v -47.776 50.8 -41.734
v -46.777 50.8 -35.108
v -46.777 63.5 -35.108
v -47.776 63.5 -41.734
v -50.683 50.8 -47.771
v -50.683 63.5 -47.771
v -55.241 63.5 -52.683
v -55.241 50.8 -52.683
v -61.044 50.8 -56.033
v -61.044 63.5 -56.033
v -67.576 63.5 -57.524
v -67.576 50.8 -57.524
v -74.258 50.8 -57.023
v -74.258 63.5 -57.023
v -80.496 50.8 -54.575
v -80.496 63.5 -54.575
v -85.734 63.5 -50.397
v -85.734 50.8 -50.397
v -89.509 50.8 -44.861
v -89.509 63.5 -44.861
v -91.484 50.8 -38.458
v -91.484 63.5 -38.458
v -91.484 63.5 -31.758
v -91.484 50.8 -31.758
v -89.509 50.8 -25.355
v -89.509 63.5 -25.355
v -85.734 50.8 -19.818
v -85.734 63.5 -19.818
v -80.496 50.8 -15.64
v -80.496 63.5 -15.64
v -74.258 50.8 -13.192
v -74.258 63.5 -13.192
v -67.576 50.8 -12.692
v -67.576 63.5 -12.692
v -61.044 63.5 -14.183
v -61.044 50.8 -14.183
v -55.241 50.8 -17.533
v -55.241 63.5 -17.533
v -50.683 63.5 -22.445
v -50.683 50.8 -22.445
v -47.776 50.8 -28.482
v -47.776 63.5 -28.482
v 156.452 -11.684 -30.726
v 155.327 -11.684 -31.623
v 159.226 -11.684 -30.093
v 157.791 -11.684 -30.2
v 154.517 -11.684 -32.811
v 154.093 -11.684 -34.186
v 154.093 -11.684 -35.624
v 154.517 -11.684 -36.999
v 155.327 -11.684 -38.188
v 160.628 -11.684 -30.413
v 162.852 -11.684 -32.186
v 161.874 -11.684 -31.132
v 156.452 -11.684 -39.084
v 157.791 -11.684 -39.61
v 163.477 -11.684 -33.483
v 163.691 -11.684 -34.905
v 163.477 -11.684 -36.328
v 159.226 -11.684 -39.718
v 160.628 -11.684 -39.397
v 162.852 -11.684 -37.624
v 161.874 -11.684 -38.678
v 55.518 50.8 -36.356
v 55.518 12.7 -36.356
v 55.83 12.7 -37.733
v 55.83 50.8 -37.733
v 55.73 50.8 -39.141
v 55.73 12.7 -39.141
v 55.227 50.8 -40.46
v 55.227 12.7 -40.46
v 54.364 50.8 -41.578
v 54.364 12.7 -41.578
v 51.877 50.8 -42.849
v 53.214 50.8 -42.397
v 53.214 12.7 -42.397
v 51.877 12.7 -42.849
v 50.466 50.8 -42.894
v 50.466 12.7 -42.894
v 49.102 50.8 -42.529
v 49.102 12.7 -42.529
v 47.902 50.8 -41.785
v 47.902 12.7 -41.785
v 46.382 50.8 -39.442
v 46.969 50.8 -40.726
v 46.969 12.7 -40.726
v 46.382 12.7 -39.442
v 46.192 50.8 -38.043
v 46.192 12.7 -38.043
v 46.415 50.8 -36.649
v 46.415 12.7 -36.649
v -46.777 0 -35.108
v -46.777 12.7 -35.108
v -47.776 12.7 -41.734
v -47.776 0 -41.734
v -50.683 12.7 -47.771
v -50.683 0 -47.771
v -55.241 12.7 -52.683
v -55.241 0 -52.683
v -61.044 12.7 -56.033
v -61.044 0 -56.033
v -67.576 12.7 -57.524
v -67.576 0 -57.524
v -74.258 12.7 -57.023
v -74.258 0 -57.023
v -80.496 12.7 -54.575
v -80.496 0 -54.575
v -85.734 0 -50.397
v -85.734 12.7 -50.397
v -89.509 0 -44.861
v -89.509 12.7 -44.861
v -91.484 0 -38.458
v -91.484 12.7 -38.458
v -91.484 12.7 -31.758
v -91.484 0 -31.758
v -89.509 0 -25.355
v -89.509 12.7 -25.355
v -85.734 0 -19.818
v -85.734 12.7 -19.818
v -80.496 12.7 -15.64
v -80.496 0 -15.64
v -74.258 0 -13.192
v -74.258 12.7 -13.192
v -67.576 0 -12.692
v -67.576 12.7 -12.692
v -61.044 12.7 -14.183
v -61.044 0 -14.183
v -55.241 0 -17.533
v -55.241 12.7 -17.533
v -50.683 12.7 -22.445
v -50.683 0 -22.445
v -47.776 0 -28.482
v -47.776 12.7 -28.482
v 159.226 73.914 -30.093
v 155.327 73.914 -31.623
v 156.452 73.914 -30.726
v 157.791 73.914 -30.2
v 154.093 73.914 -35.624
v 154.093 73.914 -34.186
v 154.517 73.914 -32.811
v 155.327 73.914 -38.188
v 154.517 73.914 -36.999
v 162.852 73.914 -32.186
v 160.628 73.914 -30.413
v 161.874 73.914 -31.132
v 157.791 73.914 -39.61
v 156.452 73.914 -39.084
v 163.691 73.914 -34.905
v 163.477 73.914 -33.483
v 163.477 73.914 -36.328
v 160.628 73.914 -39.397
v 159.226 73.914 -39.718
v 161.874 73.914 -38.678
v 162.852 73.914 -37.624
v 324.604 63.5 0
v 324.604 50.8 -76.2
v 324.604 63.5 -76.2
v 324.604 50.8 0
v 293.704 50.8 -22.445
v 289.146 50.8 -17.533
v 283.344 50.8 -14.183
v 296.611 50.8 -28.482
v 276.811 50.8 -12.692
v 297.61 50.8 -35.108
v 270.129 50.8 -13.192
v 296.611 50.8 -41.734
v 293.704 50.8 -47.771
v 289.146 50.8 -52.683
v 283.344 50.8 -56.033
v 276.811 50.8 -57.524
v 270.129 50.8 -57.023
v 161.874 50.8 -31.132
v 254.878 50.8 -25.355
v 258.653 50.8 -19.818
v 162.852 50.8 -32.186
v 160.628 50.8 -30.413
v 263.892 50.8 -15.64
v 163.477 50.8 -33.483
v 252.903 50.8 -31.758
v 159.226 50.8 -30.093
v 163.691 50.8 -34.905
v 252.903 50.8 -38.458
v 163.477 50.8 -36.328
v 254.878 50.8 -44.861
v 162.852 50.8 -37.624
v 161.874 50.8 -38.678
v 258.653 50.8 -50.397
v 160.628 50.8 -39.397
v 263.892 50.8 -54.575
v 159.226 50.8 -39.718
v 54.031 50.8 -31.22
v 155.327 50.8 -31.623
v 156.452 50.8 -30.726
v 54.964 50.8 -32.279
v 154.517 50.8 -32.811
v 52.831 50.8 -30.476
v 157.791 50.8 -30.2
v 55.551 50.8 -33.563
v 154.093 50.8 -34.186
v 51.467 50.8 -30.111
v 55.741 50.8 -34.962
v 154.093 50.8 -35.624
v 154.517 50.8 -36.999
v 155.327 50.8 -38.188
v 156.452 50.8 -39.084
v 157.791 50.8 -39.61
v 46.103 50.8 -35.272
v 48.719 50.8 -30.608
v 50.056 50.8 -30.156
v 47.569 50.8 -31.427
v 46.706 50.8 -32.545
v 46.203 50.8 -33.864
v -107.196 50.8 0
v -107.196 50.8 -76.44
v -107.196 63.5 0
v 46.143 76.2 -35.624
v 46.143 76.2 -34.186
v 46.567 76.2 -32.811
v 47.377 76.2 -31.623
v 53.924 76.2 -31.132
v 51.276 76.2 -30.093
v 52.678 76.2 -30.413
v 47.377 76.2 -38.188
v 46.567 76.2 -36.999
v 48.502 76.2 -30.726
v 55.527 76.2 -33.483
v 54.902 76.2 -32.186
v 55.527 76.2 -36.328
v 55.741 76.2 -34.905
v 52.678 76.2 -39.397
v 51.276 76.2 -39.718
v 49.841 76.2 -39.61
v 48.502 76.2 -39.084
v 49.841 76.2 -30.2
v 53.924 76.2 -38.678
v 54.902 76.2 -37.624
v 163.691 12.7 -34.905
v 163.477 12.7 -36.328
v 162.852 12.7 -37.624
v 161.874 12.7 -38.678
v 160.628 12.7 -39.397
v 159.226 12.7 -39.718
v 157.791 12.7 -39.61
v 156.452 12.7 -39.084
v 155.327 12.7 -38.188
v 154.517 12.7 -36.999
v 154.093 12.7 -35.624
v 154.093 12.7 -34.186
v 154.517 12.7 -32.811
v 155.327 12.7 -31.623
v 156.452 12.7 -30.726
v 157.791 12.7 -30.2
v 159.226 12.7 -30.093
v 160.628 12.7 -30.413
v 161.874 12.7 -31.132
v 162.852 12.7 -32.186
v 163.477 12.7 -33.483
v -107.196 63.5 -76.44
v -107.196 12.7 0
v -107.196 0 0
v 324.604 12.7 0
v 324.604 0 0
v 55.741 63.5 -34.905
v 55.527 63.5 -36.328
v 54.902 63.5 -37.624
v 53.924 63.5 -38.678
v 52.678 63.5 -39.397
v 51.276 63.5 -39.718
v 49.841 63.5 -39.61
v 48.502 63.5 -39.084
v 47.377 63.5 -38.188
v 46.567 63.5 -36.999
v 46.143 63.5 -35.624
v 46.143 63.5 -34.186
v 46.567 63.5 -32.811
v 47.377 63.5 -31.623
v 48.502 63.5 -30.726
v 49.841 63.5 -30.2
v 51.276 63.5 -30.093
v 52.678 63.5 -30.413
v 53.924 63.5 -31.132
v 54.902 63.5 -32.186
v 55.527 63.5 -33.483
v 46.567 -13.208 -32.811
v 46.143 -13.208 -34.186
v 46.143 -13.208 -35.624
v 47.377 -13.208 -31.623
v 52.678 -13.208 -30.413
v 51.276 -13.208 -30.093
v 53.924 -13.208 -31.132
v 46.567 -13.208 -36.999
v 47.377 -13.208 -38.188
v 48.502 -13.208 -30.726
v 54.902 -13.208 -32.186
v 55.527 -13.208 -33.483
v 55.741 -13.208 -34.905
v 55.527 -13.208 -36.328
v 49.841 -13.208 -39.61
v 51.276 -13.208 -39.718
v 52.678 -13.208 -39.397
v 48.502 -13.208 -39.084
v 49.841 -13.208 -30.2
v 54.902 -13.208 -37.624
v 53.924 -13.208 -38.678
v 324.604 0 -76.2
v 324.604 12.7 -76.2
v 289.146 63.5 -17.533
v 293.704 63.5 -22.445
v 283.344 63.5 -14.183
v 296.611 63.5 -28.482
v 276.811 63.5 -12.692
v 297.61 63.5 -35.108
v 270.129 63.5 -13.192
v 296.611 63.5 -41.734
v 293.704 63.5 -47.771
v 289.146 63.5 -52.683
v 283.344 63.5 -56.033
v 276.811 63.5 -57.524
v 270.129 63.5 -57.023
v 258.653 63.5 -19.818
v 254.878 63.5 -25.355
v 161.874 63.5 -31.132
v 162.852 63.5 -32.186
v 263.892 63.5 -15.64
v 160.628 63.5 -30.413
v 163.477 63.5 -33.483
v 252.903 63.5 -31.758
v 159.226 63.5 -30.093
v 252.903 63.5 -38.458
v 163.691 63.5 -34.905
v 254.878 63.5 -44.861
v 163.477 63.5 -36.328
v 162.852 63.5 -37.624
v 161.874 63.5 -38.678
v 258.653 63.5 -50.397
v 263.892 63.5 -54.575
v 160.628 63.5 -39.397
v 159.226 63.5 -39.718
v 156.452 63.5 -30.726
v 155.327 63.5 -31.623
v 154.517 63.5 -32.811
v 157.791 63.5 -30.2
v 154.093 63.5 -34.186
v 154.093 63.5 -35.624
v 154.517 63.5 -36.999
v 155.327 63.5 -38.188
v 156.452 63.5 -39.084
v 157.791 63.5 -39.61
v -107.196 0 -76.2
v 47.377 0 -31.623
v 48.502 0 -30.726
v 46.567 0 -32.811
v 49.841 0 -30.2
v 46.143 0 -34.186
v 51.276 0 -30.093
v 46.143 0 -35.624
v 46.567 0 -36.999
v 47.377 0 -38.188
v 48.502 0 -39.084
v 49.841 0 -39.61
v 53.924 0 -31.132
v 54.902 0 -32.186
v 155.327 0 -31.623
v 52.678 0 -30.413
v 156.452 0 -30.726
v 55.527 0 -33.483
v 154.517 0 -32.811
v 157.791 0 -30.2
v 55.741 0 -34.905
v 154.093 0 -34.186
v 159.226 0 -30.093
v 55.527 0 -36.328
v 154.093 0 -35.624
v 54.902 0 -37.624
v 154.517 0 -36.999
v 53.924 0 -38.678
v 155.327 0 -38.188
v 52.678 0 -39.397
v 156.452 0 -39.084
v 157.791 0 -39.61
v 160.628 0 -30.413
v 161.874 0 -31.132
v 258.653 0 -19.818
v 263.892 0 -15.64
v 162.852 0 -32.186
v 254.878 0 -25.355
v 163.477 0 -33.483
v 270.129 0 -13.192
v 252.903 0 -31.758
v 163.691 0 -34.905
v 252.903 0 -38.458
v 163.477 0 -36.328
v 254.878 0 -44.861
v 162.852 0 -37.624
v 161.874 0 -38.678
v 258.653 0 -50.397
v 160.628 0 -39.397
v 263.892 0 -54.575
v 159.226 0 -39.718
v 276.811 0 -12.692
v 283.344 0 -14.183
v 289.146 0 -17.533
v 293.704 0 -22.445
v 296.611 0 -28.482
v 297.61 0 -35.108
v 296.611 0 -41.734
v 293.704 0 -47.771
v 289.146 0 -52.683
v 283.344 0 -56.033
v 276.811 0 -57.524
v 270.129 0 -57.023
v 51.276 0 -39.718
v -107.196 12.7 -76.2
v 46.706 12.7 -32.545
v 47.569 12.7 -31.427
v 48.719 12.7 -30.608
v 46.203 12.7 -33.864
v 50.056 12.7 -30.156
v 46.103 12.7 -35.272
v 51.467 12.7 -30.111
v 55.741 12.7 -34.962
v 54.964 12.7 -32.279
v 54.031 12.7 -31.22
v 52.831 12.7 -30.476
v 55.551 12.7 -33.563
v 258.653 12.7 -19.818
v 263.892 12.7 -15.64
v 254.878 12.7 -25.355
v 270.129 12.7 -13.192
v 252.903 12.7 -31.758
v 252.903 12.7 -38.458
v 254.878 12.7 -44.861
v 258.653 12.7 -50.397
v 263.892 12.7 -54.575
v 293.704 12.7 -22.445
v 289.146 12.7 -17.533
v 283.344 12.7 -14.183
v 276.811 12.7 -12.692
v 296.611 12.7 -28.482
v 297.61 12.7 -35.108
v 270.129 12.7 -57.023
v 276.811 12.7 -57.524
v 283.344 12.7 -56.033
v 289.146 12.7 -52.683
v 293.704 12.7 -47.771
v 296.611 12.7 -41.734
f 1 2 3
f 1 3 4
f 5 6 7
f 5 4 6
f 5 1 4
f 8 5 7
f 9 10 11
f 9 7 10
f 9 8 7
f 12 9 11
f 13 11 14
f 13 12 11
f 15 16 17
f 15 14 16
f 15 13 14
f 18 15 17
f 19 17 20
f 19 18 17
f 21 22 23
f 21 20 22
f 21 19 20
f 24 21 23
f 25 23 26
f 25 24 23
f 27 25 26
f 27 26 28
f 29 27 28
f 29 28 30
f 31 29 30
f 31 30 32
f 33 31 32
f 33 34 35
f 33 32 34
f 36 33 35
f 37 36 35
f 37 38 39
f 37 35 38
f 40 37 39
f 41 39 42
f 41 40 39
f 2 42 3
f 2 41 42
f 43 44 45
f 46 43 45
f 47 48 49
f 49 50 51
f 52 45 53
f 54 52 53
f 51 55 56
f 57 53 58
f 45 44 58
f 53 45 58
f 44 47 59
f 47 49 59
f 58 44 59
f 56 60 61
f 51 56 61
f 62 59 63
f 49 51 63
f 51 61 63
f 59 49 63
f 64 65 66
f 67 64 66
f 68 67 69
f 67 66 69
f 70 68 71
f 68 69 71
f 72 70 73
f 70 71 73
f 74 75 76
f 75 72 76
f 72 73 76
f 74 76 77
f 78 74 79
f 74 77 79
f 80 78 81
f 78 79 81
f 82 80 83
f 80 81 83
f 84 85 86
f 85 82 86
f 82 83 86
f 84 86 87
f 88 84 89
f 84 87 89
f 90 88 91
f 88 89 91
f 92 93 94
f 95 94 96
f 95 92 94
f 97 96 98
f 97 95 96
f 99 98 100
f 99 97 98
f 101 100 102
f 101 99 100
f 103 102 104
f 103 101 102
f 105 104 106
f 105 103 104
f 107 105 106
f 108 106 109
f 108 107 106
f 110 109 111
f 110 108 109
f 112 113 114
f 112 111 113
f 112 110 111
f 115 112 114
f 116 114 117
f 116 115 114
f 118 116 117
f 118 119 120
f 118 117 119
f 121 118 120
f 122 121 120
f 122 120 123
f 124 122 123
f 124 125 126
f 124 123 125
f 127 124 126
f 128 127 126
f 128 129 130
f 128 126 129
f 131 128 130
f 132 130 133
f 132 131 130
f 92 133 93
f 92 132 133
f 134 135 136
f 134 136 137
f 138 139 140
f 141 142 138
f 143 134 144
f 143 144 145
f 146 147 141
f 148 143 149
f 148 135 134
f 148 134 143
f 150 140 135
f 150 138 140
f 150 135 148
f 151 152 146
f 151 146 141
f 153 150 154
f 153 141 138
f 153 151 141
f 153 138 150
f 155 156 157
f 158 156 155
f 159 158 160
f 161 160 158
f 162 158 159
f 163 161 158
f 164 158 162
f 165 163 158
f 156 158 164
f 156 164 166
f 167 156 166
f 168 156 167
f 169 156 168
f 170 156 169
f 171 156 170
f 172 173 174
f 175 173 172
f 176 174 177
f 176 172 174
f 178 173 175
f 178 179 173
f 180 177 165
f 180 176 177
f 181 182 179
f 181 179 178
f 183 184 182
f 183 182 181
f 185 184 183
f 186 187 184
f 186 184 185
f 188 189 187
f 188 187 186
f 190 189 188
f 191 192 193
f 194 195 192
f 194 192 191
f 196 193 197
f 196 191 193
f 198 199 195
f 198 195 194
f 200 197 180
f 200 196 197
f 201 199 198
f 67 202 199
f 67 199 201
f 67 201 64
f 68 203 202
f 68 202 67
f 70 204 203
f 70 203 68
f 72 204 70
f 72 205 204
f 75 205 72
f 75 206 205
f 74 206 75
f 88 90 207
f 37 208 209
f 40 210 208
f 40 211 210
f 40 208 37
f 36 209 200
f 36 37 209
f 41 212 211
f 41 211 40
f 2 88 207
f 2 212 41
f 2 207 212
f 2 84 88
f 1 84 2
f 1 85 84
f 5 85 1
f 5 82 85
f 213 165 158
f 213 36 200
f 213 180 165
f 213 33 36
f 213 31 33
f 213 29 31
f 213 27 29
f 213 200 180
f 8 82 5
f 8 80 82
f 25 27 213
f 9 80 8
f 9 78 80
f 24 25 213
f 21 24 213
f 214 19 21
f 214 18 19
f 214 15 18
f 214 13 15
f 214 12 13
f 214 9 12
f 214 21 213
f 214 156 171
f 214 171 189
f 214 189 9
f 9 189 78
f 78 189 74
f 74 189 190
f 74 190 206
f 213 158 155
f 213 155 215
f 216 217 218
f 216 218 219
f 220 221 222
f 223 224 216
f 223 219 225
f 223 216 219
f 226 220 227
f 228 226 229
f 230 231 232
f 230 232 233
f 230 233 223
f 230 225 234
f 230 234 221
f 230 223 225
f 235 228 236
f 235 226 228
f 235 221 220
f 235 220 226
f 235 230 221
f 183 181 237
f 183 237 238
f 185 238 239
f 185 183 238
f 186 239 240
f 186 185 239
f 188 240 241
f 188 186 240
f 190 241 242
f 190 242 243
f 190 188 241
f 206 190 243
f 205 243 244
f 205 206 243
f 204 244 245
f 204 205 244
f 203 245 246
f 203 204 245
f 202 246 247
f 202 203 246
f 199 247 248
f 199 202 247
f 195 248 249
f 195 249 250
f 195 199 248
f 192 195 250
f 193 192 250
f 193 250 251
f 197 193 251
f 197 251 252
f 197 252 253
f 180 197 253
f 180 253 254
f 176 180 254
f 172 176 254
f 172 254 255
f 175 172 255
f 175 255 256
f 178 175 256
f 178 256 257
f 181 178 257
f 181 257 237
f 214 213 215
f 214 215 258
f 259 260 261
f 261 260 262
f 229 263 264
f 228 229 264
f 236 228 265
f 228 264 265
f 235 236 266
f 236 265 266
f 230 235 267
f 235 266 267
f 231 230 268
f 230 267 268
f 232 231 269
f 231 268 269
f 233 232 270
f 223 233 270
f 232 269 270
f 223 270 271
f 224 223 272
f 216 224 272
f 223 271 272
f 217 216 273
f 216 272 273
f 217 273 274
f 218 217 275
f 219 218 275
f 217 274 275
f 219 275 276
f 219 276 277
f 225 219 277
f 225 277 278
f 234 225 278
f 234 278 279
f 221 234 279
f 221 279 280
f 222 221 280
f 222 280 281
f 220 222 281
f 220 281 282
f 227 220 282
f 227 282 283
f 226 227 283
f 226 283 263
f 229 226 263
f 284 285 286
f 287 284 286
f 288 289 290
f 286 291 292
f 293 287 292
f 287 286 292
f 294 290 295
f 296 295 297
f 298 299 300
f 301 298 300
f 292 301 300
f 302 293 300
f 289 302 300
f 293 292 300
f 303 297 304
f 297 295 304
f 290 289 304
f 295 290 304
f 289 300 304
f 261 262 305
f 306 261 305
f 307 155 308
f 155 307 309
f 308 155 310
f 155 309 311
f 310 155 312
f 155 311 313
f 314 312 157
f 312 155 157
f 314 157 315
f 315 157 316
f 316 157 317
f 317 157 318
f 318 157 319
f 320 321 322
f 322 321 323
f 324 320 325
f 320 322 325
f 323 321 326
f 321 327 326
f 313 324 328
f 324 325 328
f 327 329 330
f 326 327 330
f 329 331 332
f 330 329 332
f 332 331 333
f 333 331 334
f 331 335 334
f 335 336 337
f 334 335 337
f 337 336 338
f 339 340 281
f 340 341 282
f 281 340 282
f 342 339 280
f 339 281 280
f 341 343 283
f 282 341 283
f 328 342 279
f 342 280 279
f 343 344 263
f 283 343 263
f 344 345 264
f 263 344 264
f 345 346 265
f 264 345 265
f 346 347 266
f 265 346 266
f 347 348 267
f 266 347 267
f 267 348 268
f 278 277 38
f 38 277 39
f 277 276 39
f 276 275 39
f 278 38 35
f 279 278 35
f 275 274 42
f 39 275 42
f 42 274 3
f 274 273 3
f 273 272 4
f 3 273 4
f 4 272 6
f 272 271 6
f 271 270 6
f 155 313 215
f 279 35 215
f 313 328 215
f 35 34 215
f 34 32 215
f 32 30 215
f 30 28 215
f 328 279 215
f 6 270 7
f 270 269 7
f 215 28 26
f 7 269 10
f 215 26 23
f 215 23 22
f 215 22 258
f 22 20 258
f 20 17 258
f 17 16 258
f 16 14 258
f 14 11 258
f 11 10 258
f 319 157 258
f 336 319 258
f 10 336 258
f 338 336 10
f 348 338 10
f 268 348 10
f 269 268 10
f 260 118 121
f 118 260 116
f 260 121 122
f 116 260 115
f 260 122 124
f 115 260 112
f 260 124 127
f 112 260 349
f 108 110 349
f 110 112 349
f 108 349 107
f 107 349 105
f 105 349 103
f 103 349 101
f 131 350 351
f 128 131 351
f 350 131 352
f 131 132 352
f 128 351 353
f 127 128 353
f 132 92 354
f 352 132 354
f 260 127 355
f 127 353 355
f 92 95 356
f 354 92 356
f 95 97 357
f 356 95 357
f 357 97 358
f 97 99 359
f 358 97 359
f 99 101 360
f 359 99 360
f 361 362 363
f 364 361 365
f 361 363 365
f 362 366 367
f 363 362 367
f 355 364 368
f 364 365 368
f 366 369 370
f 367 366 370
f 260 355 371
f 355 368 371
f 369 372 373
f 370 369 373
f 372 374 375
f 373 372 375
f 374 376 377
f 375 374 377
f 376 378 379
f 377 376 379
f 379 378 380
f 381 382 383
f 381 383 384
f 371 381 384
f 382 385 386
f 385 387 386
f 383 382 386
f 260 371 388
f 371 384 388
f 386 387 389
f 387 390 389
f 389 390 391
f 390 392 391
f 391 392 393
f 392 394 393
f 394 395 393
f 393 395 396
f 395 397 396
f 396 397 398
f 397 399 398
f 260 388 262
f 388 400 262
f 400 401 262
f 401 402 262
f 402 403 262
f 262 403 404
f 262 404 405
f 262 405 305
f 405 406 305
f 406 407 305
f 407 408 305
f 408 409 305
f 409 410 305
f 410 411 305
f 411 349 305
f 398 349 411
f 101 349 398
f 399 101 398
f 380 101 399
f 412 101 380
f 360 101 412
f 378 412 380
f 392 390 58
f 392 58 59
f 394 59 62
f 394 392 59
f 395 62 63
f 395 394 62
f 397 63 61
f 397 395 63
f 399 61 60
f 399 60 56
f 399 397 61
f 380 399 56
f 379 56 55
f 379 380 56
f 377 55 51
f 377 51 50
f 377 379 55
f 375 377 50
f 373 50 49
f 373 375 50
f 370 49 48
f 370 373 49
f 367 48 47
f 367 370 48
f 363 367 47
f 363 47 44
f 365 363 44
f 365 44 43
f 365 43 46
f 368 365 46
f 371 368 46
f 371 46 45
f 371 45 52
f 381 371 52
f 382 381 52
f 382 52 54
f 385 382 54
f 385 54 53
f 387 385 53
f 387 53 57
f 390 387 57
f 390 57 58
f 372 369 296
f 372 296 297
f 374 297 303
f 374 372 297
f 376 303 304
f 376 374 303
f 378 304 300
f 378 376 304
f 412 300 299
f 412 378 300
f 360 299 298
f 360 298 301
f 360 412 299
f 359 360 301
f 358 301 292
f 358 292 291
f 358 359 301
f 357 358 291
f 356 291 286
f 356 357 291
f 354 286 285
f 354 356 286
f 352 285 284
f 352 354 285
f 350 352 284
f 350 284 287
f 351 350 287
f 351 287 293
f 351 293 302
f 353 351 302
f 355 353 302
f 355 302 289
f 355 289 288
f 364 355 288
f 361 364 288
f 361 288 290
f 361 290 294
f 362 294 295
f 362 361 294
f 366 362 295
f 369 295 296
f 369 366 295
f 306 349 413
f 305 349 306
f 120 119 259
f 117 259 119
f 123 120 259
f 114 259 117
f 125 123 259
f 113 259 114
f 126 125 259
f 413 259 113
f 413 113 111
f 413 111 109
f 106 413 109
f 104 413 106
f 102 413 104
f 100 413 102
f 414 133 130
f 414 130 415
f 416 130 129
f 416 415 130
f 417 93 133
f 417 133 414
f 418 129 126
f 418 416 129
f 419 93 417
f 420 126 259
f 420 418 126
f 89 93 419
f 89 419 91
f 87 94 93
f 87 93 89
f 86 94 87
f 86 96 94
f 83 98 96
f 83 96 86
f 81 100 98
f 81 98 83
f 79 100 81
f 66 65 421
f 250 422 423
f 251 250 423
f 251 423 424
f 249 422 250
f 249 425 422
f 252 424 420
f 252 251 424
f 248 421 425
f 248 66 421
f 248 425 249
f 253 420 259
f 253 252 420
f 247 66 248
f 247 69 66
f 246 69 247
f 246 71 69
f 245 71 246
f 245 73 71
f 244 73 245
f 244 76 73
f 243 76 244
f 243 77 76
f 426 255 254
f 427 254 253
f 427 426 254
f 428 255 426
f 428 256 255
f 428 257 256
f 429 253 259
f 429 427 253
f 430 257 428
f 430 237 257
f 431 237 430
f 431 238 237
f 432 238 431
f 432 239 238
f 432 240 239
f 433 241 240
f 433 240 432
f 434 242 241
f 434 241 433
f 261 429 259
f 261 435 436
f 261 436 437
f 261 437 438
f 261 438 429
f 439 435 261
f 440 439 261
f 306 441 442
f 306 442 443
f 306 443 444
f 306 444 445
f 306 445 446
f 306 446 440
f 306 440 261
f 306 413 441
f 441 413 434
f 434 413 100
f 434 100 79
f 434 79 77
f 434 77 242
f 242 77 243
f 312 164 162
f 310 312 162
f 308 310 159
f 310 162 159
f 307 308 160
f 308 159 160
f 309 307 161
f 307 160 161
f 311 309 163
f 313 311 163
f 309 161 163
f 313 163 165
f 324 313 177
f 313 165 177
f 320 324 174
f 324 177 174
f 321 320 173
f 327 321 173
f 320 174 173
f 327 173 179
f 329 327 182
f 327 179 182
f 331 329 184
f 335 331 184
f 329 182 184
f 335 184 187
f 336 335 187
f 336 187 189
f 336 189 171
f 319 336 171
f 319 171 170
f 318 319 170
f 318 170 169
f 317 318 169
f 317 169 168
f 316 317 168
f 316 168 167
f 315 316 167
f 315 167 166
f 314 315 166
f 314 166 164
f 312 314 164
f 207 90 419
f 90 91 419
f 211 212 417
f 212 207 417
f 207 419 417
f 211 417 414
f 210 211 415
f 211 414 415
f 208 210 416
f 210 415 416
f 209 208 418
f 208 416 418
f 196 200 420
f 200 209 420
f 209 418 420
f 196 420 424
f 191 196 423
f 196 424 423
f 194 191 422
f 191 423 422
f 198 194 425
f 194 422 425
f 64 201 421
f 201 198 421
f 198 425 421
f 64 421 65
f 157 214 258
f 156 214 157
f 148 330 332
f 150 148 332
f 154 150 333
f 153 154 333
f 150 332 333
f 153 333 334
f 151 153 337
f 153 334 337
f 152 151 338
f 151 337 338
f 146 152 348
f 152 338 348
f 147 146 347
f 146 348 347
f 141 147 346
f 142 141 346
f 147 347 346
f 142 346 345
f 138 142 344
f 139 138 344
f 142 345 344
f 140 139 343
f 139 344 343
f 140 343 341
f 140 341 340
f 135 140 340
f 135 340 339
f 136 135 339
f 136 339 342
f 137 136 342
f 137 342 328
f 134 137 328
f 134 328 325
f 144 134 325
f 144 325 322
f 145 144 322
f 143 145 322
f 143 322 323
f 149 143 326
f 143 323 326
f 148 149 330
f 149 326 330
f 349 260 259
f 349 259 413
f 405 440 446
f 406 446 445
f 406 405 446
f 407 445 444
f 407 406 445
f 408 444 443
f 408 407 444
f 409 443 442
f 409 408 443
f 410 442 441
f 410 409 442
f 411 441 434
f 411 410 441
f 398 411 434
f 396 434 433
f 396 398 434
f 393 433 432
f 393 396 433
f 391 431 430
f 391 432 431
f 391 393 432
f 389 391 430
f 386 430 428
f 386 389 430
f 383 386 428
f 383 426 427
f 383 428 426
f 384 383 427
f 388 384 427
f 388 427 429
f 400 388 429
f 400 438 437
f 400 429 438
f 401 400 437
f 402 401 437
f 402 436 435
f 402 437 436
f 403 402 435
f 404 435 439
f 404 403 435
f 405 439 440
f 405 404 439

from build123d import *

# Parameters (mm, degrees)
CROQUIS1_W                   = 431.8
CROQUIS1_H                   = 76.2
SALIENTE_EXTRUIR2_DEPTH      = 12.7
CROQUIS3_R                   = 4.826
SALIENTE_EXTRUIR4_DEPTH      = 63.5
CROQUIS4_R                   = 22.479
CORTAR_EXTRUIR3_DEPTH        = 219.71
CROQUIS6_R                   = 22.479
CORTAR_EXTRUIR5_DEPTH        = 180.594
SALIENTE_EXTRUIR5_DEPTH      = 12.7
CROQUIS8_R                   = 22.479
CORTAR_EXTRUIR7_DEPTH        = 46.736
CORTAR_EXTRUIR7_DEPTH_BACK   = 115.062
CROQUIS9_R                   = 22.479
CORTAR_EXTRUIR8_DEPTH        = 153.162
CORTAR_EXTRUIR8_DEPTH_BACK   = 103.886
CROQUIS10_R                  = 4.826
SALIENTE_EXTRUIR6_DEPTH      = 10.414
SALIENTE_EXTRUIR6_DEPTH_BACK = 75.184
CROQUIS12_R                  = 4.826
SALIENTE_EXTRUIR7_DEPTH      = 76.2
SALIENTE_EXTRUIR7_DEPTH_BACK = 13.208


with BuildPart() as part:
    # Croquis1 → Saliente-Extruir2 (new body)
    with BuildSketch(Plane(origin=(0, 0, 0), x_dir=(1, 0, 0), z_dir=(0, 1, 0))):
        with Locations((108.703948782, 38.1)):
            Rectangle(CROQUIS1_W, CROQUIS1_H)
    extrude(amount=SALIENTE_EXTRUIR2_DEPTH)

    # Croquis3 → Saliente-Extruir4 (add)
    with BuildSketch(Plane(origin=(0, 0, 0), x_dir=(1, 0, 0), z_dir=(0, 1, 0))):
        with Locations((-53.918932068, 38.1)):
            Circle(CROQUIS3_R)
        with Locations((51.017757536, 38.1)):
            Circle(CROQUIS3_R)
    extrude(amount=SALIENTE_EXTRUIR4_DEPTH)

    # Croquis4 → Cortar-Extruir3 (cut)
    with BuildSketch(Plane(origin=(0, 0, 0), x_dir=(1, 0, 0), z_dir=(0, 1, 0))):
        with Locations((275.131003884, 35.107884956)):
            Circle(CROQUIS4_R)
    extrude(amount=CORTAR_EXTRUIR3_DEPTH, mode=Mode.SUBTRACT)

    # Croquis6 → Cortar-Extruir5 (cut)
    with BuildSketch(Plane(origin=(0, 0, 0), x_dir=(1, 0, 0), z_dir=(0, 1, 0))):
        with Locations((275.131003884, 35.107884956)):
            Circle(CROQUIS6_R)
    extrude(amount=CORTAR_EXTRUIR5_DEPTH, mode=Mode.SUBTRACT)

    # Croquis7 → Saliente-Extruir5 (add)
    with BuildSketch(Plane(origin=(0, 50.8, 0), x_dir=(1, 0, 0), z_dir=(0, 1, 0))):
        Polygon((-107.196051218, 0), (-107.196051218, 76.439679068), (324.603948782, 76.2), (324.603948782, 0), align=None)
    extrude(amount=SALIENTE_EXTRUIR5_DEPTH)

    # Croquis8 → Cortar-Extruir7 (cut, two sides)
    with BuildSketch(Plane.XZ) as cortar_extruir7_sk:
        with Locations((275.131003884, -35.107884956)):
            Circle(CROQUIS8_R)
    extrude(amount=CORTAR_EXTRUIR7_DEPTH, mode=Mode.SUBTRACT)
    extrude(cortar_extruir7_sk.sketch, amount=-CORTAR_EXTRUIR7_DEPTH_BACK, mode=Mode.SUBTRACT)

    # Croquis9 → Cortar-Extruir8 (cut, two sides)
    with BuildSketch(Plane(origin=(0, 0, 0), x_dir=(1, 0, 0), z_dir=(0, 1, 0))) as cortar_extruir8_sk:
        with Locations((-69.256061559, 35.107884956)):
            Circle(CROQUIS9_R)
    extrude(amount=CORTAR_EXTRUIR8_DEPTH, mode=Mode.SUBTRACT)
    extrude(cortar_extruir8_sk.sketch, amount=-CORTAR_EXTRUIR8_DEPTH_BACK, mode=Mode.SUBTRACT)

    # Croquis10 → Saliente-Extruir6 (add, two sides)
    with BuildSketch(Plane(origin=(0, 63.5, 0), x_dir=(1, 0, 0), z_dir=(0, 1, 0))) as saliente_extruir6_sk:
        with Locations((158.865028896, 34.905026744)):
            Circle(CROQUIS10_R)
    extrude(amount=SALIENTE_EXTRUIR6_DEPTH)
    extrude(saliente_extruir6_sk.sketch, amount=-SALIENTE_EXTRUIR6_DEPTH_BACK)

    # Croquis12 → Saliente-Extruir7 (add, two sides)
    with BuildSketch(Plane(origin=(0, 0, 0), x_dir=(1, 0, 0), z_dir=(0, 1, 0))) as saliente_extruir7_sk:
        with Locations((50.915028896, 34.905026744)):
            Circle(CROQUIS12_R)
    extrude(amount=SALIENTE_EXTRUIR7_DEPTH)
    extrude(saliente_extruir7_sk.sketch, amount=-SALIENTE_EXTRUIR7_DEPTH_BACK)


solid = part.part
